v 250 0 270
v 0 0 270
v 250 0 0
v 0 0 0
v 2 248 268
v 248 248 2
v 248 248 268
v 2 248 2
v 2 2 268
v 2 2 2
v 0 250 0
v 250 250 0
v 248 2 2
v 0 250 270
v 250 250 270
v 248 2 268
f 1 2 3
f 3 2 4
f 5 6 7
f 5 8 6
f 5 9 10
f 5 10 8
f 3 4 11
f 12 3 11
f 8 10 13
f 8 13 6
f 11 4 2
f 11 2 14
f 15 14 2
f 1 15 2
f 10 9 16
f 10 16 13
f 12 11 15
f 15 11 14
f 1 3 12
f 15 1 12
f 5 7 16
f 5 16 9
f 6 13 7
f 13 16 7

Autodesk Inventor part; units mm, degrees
ref_plane "YZ Plane" through (0, 0, 0) normal (1, 0, 0) x (0, 1, 0)
ref_plane "XZ Plane" through (0, 0, 0) normal (0, 1, 0) x (-1, 0, 0)
ref_plane "XY Plane" through (0, 0, 0) normal (0, 0, 1) x (1, 0, 0)
sketch "Sketch1" plane through (0, 0, 0) normal (1, 0, 0) x (0, 1, 0)
  line L0 (0, 0) -> (250, 0)
  line L1 (250, 0) -> (250, 270)
  line L2 (250, 270) -> (0, 270)
  line L3 (0, 270) -> (0, 0)
  dimension "d0" = 250
  dimension "d1" = 270
extrude "Extrusion1" add sketch "Sketch1" along normal blind 250
shell "Shell1" thickness 2 removed faces 1 at (166.6667, 166.6667, 270)
sketch "Sketch2" plane through (0, 250, 270) normal (0, 1, 0) x (1, 0, 0)
  point P0 (0, 270)
sketch "Sketch3" plane through (2, 248, 2) normal (0, -1, 0) x (1, 0, 0)
  line L0 (0, 268) -> (246, 268) projected
  line L1 (0, 268) -> (246, 268)
  line L2 (246, 268) -> (246, 266)
  line L3 (246, 266) -> (0, 266)
  line L4 (0, 266) -> (0, 268)
  point P0 (-2, -2)
  dimension "d5" = 246
  dimension "d6" = 2
extrude "Extrusion2" add sketch "Sketch3" along normal blind 246
properties part number "Caja grande"
